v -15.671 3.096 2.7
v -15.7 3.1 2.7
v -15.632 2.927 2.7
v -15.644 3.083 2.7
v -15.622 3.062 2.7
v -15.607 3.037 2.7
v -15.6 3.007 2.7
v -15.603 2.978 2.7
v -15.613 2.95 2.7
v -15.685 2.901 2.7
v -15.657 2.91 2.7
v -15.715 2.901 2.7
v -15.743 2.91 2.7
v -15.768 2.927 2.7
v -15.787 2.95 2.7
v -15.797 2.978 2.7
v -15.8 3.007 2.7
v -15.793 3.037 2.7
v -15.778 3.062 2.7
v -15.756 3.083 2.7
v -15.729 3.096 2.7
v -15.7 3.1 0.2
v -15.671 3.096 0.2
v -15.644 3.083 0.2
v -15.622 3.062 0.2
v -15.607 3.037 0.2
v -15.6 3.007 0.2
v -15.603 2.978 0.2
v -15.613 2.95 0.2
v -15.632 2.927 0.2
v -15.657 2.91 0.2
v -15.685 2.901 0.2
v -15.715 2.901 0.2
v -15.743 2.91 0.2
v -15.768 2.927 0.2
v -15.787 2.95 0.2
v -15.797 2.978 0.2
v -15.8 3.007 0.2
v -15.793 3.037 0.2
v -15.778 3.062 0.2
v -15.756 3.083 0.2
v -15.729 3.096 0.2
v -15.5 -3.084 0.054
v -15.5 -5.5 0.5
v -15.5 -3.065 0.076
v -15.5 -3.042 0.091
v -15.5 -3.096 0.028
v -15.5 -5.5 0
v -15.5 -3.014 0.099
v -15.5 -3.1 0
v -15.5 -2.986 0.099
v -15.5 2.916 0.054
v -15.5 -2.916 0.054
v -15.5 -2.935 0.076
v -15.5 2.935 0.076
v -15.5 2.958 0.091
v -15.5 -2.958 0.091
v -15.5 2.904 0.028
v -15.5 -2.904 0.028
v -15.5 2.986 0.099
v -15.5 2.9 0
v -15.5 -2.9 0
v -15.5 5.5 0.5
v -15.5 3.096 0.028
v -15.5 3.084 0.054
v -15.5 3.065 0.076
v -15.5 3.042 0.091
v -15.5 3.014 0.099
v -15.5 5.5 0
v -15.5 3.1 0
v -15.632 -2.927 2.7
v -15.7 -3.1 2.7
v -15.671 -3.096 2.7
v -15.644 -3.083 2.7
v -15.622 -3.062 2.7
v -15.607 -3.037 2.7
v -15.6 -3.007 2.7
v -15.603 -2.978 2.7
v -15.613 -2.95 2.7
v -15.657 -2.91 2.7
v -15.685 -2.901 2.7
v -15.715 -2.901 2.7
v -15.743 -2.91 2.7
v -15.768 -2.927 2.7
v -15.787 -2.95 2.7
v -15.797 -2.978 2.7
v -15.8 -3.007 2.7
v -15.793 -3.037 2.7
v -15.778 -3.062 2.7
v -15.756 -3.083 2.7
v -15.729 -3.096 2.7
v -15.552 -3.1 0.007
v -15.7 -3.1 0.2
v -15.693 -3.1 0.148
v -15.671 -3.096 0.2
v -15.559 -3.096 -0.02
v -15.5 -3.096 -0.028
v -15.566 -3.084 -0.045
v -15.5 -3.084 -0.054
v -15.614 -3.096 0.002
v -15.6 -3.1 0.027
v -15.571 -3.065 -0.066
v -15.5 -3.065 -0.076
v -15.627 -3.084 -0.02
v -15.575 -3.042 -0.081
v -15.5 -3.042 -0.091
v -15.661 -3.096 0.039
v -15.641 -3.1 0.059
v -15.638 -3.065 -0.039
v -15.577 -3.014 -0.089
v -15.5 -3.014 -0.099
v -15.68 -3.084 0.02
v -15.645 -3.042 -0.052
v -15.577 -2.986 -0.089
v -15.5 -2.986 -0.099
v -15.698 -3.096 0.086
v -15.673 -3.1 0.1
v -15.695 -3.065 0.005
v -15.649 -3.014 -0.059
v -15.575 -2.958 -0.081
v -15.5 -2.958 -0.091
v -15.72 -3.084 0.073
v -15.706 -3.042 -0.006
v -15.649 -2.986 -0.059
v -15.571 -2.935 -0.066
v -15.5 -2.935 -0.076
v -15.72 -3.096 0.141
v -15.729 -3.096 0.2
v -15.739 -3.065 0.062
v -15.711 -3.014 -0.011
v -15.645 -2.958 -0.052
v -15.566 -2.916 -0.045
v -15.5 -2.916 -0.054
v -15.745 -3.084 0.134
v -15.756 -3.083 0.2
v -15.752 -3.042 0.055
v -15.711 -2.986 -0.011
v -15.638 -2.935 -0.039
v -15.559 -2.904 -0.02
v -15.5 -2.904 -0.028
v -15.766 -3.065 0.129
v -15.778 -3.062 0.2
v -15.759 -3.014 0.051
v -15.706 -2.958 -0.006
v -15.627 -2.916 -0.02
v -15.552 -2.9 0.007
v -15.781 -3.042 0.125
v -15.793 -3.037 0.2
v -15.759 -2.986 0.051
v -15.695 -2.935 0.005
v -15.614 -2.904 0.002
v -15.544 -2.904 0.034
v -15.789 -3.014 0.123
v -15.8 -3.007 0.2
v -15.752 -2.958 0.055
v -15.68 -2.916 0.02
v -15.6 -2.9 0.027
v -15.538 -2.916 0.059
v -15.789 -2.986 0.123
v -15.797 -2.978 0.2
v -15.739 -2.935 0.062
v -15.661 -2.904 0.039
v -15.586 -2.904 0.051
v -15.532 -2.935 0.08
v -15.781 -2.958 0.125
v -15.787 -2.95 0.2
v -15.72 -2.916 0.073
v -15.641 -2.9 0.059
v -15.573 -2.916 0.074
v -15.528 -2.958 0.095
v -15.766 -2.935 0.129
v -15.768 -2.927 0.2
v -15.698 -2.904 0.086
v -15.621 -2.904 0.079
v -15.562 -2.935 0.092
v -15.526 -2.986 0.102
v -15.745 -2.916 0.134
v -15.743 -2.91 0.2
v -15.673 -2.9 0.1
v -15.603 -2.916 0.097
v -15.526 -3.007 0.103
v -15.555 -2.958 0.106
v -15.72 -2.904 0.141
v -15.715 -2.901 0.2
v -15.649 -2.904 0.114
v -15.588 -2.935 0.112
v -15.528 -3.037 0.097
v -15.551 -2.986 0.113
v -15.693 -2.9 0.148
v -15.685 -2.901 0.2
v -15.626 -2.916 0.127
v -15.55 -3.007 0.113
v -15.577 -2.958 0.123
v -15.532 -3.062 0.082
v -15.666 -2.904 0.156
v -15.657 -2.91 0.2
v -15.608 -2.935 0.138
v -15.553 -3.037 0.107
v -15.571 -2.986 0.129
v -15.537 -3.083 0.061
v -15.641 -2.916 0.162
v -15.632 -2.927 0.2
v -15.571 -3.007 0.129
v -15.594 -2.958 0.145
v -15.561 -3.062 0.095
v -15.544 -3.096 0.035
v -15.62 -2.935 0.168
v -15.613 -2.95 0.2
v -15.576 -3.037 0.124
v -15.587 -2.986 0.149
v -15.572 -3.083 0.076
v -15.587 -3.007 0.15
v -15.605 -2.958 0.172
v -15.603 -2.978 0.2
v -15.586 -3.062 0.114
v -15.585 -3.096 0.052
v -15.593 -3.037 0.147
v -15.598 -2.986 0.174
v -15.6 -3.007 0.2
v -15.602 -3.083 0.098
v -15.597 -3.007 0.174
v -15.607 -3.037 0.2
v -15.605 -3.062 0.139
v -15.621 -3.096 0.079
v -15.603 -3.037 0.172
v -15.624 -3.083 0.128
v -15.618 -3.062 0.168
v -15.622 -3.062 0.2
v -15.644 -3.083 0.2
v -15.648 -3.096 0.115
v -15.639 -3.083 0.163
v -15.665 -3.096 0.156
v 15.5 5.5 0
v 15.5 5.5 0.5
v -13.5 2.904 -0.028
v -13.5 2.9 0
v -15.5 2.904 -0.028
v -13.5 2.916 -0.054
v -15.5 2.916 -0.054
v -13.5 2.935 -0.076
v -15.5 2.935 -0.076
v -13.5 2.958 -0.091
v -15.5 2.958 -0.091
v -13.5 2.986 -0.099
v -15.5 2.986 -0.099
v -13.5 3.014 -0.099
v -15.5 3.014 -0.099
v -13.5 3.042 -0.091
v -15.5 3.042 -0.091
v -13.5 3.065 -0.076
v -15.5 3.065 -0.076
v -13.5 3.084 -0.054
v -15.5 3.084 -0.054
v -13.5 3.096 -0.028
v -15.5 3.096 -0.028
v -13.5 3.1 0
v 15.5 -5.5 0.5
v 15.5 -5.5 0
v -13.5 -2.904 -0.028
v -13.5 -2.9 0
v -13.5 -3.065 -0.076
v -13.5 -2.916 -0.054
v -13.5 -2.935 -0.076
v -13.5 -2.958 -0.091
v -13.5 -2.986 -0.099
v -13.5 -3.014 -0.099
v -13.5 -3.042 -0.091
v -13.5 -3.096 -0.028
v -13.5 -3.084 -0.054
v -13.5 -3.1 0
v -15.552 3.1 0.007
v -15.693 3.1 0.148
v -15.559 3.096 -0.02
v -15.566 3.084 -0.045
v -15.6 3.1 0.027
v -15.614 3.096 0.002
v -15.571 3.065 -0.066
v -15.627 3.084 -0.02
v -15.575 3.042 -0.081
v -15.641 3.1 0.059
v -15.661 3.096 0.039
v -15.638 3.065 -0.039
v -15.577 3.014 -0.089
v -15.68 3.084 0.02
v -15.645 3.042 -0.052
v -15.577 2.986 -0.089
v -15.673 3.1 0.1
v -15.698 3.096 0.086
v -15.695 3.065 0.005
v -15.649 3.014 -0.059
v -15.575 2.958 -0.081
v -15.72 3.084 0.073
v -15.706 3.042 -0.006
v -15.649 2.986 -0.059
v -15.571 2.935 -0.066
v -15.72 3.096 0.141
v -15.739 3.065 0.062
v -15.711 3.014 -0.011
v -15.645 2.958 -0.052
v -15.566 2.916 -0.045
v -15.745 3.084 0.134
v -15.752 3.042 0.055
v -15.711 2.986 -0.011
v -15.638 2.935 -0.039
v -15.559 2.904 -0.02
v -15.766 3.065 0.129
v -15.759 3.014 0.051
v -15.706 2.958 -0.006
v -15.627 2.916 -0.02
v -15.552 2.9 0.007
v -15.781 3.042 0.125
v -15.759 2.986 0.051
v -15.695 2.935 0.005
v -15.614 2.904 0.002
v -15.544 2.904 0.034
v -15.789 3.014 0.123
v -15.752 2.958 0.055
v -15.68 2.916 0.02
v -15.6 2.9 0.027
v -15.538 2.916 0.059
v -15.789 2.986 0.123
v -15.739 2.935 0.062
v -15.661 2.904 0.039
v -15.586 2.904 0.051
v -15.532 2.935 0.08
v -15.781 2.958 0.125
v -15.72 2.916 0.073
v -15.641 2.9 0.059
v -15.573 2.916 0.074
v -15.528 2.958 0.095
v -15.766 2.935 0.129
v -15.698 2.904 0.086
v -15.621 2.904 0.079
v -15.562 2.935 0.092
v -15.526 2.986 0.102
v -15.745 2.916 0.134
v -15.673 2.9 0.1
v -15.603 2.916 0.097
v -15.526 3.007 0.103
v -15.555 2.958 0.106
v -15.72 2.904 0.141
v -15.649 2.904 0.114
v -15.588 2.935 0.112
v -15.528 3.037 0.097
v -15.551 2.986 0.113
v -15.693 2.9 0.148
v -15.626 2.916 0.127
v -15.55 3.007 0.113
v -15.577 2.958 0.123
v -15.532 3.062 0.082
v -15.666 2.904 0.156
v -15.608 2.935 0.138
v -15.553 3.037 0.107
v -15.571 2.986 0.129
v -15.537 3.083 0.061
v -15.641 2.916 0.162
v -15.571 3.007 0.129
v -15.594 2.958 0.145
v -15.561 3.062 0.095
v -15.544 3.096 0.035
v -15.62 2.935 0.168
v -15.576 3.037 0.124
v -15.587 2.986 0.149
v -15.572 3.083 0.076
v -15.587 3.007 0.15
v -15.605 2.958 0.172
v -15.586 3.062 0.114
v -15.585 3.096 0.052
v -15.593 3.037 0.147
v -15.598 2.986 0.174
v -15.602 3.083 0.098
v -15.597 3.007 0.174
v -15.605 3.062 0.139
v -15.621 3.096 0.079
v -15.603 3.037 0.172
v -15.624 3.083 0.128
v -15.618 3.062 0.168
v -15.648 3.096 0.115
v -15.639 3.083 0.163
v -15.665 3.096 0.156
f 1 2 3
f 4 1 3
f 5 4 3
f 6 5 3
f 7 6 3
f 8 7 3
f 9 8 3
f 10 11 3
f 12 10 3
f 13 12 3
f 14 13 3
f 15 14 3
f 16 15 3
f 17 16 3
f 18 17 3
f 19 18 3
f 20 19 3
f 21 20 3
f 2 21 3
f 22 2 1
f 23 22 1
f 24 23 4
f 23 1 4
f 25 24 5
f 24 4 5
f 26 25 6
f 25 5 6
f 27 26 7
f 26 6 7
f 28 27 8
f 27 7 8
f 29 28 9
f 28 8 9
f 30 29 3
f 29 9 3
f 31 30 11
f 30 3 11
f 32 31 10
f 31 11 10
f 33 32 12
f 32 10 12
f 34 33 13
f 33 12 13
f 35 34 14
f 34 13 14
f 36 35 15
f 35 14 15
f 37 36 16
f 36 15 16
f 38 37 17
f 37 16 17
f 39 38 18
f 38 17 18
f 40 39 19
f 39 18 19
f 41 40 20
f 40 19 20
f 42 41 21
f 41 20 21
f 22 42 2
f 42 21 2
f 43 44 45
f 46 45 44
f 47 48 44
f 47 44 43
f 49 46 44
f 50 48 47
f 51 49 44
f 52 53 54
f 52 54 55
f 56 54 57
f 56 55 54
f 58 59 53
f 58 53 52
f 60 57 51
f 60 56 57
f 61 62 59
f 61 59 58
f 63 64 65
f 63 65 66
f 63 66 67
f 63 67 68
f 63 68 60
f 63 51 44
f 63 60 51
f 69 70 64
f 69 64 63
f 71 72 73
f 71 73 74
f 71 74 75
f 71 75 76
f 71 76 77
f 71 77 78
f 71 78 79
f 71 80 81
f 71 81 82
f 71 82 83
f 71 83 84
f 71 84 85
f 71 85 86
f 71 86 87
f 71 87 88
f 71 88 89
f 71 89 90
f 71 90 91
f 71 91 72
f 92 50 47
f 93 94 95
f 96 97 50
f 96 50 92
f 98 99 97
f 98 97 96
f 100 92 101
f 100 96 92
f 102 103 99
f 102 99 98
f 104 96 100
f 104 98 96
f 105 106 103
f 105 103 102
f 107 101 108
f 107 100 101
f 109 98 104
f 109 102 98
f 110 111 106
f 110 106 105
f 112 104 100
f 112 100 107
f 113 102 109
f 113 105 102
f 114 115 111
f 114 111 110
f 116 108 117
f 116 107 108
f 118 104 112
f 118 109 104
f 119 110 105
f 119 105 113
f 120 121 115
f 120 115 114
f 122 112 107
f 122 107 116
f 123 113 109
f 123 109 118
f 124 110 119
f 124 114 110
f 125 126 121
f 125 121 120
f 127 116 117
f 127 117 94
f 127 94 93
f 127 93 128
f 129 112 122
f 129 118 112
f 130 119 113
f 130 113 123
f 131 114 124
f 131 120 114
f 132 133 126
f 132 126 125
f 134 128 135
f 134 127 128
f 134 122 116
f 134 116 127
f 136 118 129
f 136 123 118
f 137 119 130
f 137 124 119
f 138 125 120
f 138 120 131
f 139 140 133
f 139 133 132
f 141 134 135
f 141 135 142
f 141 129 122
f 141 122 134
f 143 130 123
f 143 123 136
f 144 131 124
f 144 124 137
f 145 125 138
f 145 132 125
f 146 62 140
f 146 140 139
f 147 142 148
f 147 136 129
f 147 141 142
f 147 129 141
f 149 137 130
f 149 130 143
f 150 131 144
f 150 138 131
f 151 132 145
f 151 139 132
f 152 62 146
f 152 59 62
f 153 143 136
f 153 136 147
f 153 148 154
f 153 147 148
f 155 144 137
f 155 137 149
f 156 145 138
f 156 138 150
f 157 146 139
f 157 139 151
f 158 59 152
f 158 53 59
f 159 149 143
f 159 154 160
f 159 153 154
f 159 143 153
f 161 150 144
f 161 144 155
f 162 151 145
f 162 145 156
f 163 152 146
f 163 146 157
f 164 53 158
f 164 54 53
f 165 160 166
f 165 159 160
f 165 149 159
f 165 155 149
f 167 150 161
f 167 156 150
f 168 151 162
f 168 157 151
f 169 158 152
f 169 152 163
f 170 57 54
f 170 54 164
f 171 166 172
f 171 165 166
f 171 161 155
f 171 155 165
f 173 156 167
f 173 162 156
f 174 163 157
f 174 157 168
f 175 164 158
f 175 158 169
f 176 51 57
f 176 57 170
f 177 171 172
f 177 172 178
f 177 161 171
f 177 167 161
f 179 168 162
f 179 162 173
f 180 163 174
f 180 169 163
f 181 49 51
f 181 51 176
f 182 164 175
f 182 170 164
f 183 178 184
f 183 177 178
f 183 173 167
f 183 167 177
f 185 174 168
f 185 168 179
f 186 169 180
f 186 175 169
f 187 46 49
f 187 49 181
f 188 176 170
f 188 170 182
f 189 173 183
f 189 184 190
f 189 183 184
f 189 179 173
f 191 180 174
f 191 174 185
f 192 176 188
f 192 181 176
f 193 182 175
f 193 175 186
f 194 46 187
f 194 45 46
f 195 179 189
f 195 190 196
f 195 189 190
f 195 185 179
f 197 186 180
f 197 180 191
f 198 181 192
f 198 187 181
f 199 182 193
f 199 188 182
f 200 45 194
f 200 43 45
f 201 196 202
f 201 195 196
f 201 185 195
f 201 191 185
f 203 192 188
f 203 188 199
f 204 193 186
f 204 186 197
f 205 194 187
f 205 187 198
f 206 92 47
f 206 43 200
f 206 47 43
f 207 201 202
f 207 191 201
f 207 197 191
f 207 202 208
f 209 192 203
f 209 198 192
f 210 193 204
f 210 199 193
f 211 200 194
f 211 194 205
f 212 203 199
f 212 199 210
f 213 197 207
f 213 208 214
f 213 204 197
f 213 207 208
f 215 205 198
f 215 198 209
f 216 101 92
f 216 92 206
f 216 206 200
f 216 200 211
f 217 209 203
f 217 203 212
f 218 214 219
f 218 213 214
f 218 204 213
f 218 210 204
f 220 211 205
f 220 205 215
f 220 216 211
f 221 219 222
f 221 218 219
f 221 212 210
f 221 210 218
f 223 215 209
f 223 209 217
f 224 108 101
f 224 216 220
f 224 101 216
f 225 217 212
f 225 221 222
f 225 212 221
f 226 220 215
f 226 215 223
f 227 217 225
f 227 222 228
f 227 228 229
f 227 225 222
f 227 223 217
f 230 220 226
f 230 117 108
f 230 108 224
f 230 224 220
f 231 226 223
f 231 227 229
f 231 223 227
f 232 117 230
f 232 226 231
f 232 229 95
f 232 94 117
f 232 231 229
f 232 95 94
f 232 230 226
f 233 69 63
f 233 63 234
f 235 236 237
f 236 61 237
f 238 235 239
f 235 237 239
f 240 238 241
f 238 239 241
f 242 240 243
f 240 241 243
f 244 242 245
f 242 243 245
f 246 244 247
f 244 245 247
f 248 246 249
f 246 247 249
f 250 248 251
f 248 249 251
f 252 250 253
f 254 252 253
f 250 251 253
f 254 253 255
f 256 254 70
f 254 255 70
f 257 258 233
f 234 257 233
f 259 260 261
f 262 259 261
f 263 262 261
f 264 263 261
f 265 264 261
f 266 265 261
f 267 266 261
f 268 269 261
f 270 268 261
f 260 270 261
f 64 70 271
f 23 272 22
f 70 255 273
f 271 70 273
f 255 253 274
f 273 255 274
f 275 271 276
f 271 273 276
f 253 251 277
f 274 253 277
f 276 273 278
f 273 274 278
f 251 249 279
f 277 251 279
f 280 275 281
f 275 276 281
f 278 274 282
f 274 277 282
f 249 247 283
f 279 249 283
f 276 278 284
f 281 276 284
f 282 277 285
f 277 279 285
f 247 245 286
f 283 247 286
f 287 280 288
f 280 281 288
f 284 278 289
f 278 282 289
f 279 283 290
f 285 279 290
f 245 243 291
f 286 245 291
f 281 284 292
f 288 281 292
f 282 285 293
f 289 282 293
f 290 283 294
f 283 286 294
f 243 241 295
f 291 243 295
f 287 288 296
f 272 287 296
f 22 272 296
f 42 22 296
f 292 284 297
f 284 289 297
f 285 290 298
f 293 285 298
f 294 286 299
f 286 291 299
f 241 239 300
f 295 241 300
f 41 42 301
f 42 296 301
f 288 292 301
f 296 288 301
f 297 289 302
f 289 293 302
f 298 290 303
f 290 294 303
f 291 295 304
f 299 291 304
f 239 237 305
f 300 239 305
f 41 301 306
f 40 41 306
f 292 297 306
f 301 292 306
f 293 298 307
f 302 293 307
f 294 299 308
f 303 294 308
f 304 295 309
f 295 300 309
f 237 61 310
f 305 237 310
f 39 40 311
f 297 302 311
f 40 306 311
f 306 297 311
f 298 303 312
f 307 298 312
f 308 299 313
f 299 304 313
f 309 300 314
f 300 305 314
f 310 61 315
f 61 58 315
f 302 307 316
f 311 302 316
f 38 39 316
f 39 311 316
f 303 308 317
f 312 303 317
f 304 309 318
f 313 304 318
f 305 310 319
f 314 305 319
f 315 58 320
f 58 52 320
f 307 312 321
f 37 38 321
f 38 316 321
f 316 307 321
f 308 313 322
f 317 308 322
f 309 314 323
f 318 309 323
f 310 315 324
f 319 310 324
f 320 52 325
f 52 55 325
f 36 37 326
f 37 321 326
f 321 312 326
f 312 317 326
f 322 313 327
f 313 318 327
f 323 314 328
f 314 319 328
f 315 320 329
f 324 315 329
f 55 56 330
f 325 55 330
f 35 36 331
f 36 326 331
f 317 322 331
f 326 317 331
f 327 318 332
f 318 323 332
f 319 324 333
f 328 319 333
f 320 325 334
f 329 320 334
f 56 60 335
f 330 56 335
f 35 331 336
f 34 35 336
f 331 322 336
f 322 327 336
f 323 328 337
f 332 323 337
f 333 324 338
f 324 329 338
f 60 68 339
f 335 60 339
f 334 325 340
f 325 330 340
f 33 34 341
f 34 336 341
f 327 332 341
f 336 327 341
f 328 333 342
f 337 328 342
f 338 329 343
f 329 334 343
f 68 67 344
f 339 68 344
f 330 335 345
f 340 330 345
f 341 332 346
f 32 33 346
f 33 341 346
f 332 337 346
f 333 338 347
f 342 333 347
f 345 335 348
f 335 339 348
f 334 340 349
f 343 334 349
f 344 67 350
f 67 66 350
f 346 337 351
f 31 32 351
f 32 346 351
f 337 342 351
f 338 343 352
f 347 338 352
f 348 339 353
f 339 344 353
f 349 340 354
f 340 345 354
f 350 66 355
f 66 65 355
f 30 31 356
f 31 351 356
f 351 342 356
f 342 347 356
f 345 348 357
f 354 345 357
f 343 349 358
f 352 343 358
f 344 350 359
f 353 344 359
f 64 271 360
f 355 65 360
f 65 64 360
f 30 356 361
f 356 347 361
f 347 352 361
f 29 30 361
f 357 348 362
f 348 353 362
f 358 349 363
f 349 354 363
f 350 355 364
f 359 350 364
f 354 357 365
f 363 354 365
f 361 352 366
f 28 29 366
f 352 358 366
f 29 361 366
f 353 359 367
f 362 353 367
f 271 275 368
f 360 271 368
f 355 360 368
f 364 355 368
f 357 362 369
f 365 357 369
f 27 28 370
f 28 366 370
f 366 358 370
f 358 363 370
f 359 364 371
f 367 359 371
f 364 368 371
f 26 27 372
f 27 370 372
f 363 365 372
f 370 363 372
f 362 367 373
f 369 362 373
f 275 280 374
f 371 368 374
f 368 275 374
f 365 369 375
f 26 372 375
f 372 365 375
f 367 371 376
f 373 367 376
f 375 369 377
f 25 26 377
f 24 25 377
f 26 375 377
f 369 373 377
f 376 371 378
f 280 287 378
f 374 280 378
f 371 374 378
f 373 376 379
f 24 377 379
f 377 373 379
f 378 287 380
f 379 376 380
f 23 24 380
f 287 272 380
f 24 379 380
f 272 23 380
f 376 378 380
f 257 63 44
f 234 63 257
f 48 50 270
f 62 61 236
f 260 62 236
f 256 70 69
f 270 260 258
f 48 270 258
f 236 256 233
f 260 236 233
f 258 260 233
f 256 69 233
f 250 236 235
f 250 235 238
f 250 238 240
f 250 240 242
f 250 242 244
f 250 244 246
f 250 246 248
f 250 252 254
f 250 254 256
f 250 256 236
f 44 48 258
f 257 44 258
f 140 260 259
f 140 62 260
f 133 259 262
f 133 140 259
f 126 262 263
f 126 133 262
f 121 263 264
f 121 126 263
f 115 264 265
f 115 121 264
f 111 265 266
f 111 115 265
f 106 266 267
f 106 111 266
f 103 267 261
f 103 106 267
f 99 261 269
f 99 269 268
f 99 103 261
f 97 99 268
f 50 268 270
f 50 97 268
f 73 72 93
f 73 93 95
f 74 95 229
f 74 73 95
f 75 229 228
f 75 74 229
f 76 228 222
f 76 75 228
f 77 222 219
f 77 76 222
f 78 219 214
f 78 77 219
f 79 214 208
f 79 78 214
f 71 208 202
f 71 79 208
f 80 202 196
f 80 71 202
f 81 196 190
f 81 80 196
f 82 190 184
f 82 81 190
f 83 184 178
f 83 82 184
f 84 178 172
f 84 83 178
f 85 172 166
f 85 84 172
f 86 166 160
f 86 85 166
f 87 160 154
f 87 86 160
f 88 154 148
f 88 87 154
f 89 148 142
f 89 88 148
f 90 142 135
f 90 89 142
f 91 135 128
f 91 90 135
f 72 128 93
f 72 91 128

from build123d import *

# Parameters (mm, degrees)
SKETCH005_W  = 31
SKETCH005_H  = 11
PAD001_DEPTH = 0.5
SKETCH006_R  = 0.1


with BuildPart() as part:
    # Sketch005 → Pad001 (new body)
    with BuildSketch(Plane.XY):
        Rectangle(SKETCH005_W, SKETCH005_H)
    extrude(amount=PAD001_DEPTH)

    # AdditivePipe001: sweep along a path in Sketch008
    with BuildLine(Plane(origin=(-13.5, -3, 0), x_dir=(-1, 0, 0), z_dir=(0, 1, 0))) as additivepipe001_path:
        Line((0, 0), (2, 0))
        ThreePointArc((2, 0), (2.141421, 0.058579), (2.2, 0.2))
        Line((2.2, 0.2), (2.2, 2.7))
    # Sketch006 (on DatumPlane) → AdditivePipe001 (sweep)
    with BuildSketch(Plane(origin=(-13.5, 0, 0), x_dir=(0, -1, 0), z_dir=(-1, 0, 0))):
        with Locations((3, 0)):
            Circle(SKETCH006_R)
    additivepipe001 = sweep(path=additivepipe001_path.line)

    # Mirrored001: AdditivePipe001 across Sketch006 V_Axis
    add(additivepipe001.mirror(Plane(origin=(-13.5, 0, 0), x_dir=(-1, 0, 0), z_dir=(0, -1, 0))))


solid = part.part
